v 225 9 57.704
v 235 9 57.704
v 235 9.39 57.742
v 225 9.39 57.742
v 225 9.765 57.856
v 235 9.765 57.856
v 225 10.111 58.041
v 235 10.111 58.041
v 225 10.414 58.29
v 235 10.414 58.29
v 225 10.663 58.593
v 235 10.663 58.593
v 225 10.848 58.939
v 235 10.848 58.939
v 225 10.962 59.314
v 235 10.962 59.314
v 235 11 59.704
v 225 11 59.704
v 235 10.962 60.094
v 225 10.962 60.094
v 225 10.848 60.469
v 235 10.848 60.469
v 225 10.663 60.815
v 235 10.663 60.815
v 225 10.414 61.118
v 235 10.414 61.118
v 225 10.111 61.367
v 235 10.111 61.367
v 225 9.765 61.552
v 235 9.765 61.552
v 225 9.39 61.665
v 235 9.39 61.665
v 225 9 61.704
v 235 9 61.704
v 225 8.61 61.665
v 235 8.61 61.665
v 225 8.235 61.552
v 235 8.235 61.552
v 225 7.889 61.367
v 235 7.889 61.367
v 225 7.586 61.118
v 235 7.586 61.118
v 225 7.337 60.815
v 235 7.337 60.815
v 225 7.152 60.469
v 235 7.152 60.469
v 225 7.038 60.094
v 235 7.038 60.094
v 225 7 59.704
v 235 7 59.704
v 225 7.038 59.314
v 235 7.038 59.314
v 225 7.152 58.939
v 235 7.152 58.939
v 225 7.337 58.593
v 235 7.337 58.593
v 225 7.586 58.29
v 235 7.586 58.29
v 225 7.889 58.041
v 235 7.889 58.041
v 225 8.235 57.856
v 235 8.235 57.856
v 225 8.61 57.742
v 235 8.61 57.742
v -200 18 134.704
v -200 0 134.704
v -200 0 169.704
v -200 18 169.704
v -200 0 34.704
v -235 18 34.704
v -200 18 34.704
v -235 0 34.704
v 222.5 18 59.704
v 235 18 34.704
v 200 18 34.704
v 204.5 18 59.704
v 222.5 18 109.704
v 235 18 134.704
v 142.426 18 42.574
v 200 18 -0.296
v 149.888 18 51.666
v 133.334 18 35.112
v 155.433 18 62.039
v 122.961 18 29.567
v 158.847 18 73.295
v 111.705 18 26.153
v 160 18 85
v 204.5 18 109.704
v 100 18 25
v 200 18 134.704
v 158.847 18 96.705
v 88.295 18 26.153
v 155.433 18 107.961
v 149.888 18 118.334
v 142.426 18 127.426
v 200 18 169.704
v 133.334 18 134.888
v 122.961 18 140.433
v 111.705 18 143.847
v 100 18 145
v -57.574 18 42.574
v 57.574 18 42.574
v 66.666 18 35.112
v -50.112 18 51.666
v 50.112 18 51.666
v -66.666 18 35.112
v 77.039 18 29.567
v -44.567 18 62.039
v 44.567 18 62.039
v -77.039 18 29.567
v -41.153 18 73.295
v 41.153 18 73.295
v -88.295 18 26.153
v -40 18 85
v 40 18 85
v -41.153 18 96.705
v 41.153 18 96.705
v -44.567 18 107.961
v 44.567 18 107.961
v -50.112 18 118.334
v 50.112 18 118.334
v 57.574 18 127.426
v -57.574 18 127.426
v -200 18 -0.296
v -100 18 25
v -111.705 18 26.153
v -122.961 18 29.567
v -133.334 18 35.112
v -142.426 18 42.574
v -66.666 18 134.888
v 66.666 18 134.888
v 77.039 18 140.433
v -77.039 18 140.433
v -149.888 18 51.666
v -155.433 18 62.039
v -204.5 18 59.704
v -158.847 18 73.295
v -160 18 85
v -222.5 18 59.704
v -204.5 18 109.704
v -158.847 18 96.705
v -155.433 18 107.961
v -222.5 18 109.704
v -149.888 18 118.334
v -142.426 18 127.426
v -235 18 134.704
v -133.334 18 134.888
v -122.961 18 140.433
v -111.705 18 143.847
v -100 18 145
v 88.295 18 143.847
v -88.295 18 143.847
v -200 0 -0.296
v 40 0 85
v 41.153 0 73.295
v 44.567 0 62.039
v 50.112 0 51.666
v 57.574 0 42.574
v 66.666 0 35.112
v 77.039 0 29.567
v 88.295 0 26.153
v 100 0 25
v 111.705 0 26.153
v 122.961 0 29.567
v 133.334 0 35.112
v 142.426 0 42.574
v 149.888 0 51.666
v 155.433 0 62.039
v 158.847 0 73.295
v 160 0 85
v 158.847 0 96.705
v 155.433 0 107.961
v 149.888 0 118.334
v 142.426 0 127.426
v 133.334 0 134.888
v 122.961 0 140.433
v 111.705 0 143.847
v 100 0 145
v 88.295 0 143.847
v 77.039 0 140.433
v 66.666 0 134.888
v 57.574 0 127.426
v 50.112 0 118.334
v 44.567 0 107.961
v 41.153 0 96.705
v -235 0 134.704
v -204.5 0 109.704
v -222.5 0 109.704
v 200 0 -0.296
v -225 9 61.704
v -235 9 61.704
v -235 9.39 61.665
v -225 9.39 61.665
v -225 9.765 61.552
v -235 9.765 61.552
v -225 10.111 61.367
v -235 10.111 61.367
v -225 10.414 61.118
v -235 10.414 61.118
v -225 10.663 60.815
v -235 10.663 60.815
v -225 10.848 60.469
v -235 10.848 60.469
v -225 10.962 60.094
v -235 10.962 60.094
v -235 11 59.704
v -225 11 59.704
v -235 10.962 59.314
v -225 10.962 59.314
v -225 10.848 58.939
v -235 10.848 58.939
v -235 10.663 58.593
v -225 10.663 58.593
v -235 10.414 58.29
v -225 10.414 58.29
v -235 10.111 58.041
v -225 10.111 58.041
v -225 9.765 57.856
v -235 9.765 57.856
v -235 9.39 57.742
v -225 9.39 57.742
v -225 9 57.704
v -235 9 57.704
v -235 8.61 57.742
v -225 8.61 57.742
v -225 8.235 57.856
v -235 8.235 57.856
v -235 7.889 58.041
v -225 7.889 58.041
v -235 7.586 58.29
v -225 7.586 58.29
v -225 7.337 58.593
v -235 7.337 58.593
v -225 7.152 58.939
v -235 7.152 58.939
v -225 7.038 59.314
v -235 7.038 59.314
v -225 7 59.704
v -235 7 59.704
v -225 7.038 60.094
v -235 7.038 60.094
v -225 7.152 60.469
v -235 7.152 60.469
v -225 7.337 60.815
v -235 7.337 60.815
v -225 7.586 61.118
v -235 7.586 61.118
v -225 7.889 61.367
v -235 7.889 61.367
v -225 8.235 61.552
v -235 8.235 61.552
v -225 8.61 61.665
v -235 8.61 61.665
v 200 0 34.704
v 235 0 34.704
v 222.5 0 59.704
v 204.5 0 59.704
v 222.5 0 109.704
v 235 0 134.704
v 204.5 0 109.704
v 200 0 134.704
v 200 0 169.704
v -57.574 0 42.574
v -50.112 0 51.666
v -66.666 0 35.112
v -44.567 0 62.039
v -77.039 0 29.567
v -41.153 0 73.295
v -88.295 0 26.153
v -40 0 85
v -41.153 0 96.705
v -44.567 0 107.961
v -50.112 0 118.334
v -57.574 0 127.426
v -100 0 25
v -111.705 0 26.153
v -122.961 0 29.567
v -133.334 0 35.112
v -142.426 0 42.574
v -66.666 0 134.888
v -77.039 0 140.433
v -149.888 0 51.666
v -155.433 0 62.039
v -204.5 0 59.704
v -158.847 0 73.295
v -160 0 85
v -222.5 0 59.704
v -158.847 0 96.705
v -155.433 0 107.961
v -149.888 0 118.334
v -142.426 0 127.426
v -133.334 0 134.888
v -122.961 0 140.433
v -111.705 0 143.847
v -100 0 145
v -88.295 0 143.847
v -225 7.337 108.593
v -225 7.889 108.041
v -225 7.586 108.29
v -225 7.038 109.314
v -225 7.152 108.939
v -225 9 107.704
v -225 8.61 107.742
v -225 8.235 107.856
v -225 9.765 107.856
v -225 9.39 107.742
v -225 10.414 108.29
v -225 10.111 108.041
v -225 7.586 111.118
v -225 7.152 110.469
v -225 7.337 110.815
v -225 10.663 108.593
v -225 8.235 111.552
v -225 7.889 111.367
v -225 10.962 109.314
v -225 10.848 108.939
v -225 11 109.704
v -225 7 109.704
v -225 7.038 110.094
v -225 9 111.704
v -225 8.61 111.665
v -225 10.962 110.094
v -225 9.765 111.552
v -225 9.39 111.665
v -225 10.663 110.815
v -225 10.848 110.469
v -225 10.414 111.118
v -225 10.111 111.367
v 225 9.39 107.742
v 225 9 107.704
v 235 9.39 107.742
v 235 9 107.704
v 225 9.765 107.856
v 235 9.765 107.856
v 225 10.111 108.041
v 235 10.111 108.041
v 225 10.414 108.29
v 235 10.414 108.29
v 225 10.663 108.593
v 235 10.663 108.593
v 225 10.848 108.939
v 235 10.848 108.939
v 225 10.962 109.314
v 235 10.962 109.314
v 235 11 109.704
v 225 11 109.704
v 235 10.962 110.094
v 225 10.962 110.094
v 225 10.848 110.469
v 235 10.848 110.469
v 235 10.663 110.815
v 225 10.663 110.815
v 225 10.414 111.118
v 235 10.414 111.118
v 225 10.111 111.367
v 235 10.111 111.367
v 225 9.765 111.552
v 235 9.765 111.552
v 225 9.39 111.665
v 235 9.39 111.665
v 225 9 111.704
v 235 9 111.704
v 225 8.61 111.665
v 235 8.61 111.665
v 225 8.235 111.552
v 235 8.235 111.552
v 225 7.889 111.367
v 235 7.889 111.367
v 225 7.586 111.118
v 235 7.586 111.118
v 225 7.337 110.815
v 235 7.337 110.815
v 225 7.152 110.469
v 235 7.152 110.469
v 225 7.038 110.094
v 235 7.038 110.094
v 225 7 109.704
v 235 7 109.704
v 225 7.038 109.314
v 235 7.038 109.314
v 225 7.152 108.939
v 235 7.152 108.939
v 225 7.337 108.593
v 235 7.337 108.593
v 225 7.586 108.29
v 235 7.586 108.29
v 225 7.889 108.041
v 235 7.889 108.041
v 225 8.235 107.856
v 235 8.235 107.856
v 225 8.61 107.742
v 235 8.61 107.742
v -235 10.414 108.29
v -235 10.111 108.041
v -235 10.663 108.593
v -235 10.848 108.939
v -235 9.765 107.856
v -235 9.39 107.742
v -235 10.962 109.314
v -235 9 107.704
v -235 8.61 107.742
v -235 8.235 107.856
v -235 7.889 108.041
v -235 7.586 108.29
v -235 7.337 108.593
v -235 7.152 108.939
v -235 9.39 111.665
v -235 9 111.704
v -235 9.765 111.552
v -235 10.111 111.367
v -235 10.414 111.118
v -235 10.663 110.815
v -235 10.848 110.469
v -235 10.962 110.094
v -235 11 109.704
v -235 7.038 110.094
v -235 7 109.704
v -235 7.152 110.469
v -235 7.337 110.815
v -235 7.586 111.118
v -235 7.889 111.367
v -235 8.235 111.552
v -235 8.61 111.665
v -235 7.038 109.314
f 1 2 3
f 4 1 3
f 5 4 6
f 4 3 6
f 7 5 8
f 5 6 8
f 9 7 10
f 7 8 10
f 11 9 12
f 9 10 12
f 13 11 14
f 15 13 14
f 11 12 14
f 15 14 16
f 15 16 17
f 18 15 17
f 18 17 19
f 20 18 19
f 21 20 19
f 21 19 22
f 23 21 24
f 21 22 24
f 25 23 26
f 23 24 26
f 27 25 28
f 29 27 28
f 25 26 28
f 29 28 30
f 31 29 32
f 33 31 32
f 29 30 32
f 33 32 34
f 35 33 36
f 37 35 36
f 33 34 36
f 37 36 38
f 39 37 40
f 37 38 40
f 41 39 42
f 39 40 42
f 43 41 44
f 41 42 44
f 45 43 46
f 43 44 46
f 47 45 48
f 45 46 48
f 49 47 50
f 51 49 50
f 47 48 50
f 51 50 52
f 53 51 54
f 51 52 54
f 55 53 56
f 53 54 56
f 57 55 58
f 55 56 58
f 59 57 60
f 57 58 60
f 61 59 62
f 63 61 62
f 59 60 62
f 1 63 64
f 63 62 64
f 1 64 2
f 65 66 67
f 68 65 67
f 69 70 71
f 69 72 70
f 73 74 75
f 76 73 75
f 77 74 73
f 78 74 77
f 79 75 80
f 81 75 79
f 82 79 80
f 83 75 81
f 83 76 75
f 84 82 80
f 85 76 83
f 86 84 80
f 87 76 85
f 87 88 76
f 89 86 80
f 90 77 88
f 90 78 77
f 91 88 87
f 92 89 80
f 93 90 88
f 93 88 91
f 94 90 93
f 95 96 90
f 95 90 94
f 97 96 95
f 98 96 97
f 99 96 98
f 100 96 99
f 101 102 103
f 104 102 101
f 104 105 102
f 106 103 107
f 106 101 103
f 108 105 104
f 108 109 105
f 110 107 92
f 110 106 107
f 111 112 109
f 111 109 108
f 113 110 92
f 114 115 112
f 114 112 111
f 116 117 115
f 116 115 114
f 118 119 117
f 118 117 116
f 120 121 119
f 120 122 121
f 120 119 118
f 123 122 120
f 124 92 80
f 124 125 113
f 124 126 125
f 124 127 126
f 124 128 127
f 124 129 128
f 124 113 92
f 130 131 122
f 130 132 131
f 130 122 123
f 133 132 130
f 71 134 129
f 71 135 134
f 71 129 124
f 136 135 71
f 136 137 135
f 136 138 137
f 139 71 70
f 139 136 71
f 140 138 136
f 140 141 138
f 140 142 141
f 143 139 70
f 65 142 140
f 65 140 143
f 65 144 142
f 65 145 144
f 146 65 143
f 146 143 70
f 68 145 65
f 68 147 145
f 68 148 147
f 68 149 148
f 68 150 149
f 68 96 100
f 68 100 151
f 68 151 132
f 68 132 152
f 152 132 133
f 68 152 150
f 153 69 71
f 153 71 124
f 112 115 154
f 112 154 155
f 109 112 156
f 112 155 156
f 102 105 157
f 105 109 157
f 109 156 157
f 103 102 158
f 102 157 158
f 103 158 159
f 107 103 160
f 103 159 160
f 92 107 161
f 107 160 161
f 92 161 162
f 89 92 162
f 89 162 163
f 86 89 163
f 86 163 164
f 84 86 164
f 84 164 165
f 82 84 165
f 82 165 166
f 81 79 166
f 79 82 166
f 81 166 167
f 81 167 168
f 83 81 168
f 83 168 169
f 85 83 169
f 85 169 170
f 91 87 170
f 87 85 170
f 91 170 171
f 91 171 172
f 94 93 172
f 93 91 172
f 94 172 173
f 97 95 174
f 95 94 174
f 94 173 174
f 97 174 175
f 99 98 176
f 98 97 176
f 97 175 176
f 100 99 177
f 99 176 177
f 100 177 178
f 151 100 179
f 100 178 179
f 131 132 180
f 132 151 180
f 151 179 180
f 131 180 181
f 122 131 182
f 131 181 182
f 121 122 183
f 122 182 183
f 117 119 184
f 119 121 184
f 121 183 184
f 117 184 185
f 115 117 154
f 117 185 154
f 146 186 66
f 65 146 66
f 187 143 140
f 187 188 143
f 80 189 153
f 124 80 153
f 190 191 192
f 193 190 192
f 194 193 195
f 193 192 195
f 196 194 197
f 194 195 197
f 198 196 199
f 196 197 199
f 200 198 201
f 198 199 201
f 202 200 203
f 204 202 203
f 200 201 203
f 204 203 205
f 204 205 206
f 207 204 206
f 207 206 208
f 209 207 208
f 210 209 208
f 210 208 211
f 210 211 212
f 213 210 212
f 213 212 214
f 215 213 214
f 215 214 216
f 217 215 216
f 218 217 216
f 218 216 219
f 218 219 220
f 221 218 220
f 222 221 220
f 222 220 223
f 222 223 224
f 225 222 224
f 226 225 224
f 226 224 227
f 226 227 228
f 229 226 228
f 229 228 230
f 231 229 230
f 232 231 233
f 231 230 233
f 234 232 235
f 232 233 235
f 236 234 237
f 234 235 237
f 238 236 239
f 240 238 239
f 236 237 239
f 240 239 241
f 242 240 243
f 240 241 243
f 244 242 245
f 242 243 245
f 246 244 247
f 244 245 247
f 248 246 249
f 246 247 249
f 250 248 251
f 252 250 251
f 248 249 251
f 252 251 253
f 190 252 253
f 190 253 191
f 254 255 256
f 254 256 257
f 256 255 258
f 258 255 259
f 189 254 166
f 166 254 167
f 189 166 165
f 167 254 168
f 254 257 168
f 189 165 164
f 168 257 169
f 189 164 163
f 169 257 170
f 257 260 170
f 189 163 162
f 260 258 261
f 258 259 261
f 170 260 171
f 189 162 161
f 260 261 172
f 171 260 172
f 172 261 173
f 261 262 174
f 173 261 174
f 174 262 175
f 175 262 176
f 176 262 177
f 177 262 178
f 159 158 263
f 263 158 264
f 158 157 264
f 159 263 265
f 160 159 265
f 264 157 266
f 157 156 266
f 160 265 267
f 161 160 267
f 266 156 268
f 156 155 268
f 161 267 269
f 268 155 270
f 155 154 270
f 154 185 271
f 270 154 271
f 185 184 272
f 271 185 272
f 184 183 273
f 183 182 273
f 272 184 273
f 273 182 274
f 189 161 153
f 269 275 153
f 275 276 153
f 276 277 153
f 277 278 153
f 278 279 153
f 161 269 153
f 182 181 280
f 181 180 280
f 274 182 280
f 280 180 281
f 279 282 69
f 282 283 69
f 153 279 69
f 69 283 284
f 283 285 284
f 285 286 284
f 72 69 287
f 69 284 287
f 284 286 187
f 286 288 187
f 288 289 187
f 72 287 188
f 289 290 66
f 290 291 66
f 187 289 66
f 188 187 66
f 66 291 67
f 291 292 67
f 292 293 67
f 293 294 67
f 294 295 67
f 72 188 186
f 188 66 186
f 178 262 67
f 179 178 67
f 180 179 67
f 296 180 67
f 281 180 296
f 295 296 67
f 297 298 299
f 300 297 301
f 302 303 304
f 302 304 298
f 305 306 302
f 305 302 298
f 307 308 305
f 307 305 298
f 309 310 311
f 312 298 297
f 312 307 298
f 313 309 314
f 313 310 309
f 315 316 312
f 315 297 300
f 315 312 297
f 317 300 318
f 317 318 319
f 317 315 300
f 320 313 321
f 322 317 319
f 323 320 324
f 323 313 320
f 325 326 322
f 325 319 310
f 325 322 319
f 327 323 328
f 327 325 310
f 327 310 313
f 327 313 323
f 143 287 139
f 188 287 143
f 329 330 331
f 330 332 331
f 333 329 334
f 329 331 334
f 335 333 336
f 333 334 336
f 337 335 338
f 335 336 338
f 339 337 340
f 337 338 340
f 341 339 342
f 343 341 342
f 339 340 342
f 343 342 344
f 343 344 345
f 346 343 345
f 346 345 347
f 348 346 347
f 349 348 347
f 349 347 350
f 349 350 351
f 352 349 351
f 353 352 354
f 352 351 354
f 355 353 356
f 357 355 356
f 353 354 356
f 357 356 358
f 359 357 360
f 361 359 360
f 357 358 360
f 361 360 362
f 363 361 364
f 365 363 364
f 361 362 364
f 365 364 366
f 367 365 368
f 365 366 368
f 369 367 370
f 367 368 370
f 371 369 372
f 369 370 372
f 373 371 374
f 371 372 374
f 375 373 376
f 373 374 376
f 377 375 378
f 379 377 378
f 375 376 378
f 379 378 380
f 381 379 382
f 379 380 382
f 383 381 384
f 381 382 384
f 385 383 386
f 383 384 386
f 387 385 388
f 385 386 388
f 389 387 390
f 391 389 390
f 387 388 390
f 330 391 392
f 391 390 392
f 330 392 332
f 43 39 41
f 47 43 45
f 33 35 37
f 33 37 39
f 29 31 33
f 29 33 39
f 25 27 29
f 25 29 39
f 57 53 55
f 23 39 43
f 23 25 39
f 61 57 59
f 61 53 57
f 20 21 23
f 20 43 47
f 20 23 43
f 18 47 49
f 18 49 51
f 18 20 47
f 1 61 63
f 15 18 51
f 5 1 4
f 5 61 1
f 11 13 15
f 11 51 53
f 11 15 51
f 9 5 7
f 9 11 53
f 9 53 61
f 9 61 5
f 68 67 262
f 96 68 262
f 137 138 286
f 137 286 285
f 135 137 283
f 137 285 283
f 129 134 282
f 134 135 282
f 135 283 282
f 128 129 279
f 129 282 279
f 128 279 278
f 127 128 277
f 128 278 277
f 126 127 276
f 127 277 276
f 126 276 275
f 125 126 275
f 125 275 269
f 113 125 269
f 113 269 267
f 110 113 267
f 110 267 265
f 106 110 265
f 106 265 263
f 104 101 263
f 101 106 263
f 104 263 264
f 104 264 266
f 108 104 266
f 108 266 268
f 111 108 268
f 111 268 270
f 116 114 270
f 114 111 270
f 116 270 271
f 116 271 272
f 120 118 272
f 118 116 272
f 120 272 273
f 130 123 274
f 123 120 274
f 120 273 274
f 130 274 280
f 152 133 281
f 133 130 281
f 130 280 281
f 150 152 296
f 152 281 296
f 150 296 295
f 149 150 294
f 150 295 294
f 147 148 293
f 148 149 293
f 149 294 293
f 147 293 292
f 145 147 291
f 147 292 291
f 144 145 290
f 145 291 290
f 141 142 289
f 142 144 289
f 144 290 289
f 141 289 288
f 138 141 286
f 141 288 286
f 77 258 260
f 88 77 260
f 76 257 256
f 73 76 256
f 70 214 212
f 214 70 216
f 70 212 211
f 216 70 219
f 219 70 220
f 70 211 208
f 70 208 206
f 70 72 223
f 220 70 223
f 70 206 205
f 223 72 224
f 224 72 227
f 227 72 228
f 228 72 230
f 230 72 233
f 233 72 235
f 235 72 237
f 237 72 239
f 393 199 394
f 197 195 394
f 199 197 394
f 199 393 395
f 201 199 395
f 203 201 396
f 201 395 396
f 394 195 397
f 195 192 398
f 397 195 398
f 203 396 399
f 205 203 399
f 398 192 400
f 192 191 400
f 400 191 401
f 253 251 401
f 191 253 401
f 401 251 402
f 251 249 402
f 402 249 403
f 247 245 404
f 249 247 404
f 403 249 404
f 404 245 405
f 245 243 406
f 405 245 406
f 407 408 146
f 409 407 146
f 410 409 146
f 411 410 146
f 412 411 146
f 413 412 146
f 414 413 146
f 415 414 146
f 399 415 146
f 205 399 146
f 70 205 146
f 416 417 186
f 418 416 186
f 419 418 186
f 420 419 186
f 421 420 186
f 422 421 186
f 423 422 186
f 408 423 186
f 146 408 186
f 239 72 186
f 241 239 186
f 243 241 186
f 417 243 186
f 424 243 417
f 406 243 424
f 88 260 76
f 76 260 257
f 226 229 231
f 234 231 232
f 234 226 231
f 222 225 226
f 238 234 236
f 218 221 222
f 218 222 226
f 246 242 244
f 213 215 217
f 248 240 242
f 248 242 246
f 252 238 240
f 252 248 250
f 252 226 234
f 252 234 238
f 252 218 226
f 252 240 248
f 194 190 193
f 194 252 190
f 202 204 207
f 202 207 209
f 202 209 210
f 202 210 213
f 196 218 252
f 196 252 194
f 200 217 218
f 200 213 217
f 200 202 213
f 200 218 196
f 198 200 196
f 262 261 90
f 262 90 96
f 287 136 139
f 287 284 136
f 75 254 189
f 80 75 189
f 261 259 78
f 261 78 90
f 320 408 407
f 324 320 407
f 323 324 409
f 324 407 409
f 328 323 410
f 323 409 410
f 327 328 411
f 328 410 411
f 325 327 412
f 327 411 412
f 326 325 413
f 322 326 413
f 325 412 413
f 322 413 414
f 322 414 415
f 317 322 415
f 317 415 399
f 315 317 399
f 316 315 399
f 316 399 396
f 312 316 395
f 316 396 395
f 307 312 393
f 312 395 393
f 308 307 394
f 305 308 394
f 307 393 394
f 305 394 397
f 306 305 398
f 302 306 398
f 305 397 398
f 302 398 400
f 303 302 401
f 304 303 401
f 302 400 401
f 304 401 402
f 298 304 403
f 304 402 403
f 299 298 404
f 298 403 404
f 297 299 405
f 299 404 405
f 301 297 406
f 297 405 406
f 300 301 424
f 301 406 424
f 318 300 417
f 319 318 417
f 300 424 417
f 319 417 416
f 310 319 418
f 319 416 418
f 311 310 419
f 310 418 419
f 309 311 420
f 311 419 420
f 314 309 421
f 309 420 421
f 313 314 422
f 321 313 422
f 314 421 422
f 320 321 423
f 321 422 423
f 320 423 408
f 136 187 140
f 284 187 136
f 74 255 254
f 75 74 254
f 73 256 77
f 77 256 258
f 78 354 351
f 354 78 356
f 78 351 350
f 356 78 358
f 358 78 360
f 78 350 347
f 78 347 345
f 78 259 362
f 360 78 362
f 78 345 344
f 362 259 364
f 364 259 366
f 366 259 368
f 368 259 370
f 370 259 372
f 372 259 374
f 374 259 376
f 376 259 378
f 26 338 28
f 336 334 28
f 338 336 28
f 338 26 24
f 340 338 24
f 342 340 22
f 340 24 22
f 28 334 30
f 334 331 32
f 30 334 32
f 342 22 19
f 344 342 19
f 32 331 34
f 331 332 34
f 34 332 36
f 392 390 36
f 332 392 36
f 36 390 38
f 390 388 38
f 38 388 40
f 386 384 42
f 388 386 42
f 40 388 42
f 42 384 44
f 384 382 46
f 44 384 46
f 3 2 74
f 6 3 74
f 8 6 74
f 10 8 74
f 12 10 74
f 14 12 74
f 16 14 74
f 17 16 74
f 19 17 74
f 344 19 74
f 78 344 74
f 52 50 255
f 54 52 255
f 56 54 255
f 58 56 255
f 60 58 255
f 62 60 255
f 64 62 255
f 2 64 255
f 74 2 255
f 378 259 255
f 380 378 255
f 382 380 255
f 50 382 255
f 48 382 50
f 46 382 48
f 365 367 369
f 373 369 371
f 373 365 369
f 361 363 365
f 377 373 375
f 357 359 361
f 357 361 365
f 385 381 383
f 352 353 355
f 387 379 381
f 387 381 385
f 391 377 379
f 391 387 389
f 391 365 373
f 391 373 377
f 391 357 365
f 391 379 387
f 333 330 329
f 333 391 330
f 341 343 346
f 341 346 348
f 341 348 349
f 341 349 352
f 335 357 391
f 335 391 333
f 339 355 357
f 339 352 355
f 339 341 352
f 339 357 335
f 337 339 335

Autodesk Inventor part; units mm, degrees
ref_plane "YZ Plane" through (0, 0, 0) normal (1, 0, 0) x (0, 1, 0)
ref_plane "XZ Plane" through (0, 0, 0) normal (0, 1, 0) x (-1, 0, 0)
ref_plane "XY Plane" through (0, 0, 0) normal (0, 0, 1) x (1, 0, 0)
sketch "Boceto1" plane through (0, 0, 0) normal (0, 1, 0) x (-1, 0, 0)
  line L0 (200, 169.7039) -> (-200, 169.7039)
  line L1 (-235, 134.7039) -> (-235, 34.7039)
  line L2 (-200, -0.2961) -> (200, -0.2961)
  line L3 (235, 34.7039) -> (235, 134.7039)
  circle A0 centre (100, 85) radius 60
  line L4 (222.5, 109.7039) -> (204.5, 109.7039)
  line L5 (204.5, 109.7039) -> (204.5, 59.7039)
  line L6 (204.5, 59.7039) -> (222.5, 59.7039)
  line L7 (222.5, 59.7039) -> (222.5, 109.7039)
  line L8 (235, 134.7039) -> (200, 134.7039)
  line L9 (200, 134.7039) -> (200, 169.7039)
  line L10 (235, 34.7039) -> (200, 34.7039)
  line L11 (200, 34.7039) -> (200, -0.2961)
  line L12 (-235, 34.7039) -> (-235, 134.7039)
  circle A1 centre (-100, 85) radius 60
  line L13 (-222.5, 109.7039) -> (-204.5, 109.7039)
  line L14 (-204.5, 109.7039) -> (-204.5, 59.7039)
  line L15 (-204.5, 59.7039) -> (-222.5, 59.7039)
  line L16 (-222.5, 59.7039) -> (-222.5, 109.7039)
  line L17 (-235, 134.7039) -> (-200, 134.7039)
  line L18 (-200, 134.7039) -> (-200, 169.7039)
  line L19 (-235, 34.7039) -> (-200, 34.7039)
  line L20 (-200, 34.7039) -> (-200, -0.2961)
  point P0 (0, 0)
  point P1 (235, 84.7039)
  point P2 (217.5, 134.7039)
  point P3 (-235, 84.7039)
  point P4 (-217.5, 134.7039)
  dimension "d4" = 120
  dimension "d5" = 18
  dimension "d6" = 35
  dimension "d7" = 35
  dimension "d8" = 35
  dimension "d9" = 50
  dimension "d10" = 25
  dimension "d11" = 12.5
  dimension "d12" = 100
  dimension "d15" = 470
  dimension "d16" = 12.5
  dimension "d17" = 18
extrude "Extrusión1" add sketch "Boceto1" along normal blind 18
sketch "Boceto2" plane through (235, 0, 134.7039) normal (1, 0, 0) x (0, 0, -1)
  circle A0 centre (75, 9) radius 2
  circle A1 centre (25, 9) radius 2
  line L0 (0, 0) -> (100, 0) projected
  line L1 (0, 0) -> (0, 18) projected
  point P0 (134.7039, 0)
  dimension "d18" = 4
  dimension "d19" = 4
  dimension "d20" = 9
  dimension "d21" = 9
  dimension "d22" = 25
  dimension "d23" = 50
extrude "Extrusión2" cut sketch "Boceto2" against normal blind 10
sketch "Boceto3" plane through (-235, 0, 34.7039) normal (-1, 0, 0) x (0, 0, 1)
  circle A0 centre (25, 9) radius 2 projected
  circle A1 centre (25, 9) radius 2
  circle A2 centre (75, 9) radius 2 projected
  circle A3 centre (75, 9) radius 2
  point P0 (-34.7039, 0)
  dimension "d26" = 4
  dimension "d27" = 4
extrude "Extrusión3" cut sketch "Boceto3" against normal blind 10
properties part number "APM_001-2"
